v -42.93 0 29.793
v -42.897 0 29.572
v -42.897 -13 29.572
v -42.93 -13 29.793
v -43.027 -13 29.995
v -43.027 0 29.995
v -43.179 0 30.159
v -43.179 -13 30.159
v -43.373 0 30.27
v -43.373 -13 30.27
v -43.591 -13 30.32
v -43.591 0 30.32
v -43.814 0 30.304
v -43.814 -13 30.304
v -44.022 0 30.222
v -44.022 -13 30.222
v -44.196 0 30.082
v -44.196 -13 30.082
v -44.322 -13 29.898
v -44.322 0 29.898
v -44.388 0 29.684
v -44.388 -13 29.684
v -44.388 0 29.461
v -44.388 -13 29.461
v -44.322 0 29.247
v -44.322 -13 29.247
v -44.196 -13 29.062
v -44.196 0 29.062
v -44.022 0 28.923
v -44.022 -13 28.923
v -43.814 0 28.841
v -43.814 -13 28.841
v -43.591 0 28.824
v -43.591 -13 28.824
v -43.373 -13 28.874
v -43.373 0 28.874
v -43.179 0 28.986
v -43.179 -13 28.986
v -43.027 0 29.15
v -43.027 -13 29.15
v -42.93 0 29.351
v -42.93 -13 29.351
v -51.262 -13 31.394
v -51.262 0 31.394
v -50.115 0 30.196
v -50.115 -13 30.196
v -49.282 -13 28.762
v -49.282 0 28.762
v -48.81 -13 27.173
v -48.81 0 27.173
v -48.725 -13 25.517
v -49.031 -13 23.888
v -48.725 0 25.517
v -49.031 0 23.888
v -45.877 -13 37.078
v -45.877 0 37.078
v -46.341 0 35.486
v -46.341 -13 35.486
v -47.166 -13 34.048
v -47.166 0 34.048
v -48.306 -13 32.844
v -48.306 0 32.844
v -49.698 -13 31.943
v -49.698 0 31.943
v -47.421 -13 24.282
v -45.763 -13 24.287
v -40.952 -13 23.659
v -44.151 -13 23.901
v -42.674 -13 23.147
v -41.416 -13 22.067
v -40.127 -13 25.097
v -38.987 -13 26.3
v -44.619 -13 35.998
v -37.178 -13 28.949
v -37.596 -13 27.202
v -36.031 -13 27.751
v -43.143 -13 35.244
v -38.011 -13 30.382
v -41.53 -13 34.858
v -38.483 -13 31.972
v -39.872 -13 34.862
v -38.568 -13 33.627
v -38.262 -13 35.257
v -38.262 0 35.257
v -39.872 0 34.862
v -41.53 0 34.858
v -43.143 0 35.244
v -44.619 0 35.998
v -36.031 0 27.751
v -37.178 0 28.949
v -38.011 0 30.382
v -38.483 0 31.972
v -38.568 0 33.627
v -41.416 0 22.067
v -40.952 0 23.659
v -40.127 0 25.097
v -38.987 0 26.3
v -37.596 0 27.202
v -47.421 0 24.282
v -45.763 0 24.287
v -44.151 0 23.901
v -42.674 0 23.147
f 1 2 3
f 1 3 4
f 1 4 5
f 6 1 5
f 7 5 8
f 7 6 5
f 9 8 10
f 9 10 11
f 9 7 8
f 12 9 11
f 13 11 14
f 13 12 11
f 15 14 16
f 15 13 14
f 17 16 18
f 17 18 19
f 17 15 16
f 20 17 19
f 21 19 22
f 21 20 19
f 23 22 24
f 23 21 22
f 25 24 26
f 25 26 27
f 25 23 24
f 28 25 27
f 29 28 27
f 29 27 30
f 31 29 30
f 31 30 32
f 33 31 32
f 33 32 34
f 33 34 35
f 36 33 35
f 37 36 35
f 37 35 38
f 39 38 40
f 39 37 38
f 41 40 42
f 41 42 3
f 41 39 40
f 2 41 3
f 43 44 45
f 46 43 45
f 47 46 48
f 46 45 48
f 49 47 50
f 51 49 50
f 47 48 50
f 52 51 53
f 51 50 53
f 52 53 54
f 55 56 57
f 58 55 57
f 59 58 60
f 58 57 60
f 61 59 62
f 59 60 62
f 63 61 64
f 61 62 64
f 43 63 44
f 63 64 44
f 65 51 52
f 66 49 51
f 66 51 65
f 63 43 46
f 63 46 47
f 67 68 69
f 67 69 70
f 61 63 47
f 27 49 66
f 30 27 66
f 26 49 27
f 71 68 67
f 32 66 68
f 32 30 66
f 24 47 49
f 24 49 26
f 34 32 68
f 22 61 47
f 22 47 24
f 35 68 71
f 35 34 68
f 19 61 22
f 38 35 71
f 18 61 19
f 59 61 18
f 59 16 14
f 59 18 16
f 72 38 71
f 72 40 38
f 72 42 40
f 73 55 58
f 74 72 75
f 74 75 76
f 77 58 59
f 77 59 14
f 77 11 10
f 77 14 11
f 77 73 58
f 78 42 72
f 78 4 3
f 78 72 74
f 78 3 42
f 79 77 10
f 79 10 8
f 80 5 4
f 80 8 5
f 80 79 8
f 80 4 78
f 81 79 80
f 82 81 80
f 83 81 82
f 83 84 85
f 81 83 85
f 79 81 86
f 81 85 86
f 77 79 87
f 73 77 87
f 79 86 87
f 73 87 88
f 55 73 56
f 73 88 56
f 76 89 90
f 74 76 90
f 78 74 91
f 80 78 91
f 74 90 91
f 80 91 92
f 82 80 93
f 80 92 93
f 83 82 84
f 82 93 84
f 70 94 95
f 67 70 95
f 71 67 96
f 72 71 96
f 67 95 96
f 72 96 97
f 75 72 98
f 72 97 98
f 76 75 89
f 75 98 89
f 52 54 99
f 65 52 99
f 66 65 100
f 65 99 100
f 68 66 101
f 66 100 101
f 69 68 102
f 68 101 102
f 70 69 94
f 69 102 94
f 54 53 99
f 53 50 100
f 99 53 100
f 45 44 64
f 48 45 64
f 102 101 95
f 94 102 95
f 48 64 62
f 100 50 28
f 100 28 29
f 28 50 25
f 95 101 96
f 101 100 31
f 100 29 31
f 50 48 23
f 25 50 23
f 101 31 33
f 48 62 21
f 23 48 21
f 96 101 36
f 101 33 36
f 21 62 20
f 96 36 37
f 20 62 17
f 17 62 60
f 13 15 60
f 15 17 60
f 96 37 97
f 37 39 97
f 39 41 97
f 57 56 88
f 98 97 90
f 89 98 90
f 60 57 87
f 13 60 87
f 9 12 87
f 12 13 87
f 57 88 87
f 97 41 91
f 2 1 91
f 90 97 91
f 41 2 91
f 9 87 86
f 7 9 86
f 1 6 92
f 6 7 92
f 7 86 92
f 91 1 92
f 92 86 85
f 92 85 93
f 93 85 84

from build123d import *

# Parameters (mm, degrees)
F0_R     = 0.75
F1_DEPTH = 13


with BuildPart() as f1:
    # F0 (on Front) → F1 (new body)
    with BuildSketch(Plane.XZ):
        with BuildLine():
            ThreePointArc((-45.877073, 37.077873), (-47.700367, 33.412388), (-51.261876, 31.393517))
            ThreePointArc((-51.261876, 31.393517), (-48.99912, 27.981756), (-49.031481, 23.887964))
            ThreePointArc((-49.031481, 23.887964), (-44.945431, 24.141687), (-41.416284, 22.066766))
            ThreePointArc((-41.416284, 22.066766), (-39.592989, 25.732251), (-36.031481, 27.751121))
            ThreePointArc((-36.031481, 27.751121), (-38.294237, 31.162883), (-38.261876, 35.256675))
            ThreePointArc((-38.261876, 35.256675), (-42.347926, 35.002951), (-45.877073, 37.077873))
        make_face()
        with Locations((-43.646678, 29.572319)):
            Circle(F0_R, mode=Mode.SUBTRACT)
    extrude(amount=F1_DEPTH)


solid = f1.part
